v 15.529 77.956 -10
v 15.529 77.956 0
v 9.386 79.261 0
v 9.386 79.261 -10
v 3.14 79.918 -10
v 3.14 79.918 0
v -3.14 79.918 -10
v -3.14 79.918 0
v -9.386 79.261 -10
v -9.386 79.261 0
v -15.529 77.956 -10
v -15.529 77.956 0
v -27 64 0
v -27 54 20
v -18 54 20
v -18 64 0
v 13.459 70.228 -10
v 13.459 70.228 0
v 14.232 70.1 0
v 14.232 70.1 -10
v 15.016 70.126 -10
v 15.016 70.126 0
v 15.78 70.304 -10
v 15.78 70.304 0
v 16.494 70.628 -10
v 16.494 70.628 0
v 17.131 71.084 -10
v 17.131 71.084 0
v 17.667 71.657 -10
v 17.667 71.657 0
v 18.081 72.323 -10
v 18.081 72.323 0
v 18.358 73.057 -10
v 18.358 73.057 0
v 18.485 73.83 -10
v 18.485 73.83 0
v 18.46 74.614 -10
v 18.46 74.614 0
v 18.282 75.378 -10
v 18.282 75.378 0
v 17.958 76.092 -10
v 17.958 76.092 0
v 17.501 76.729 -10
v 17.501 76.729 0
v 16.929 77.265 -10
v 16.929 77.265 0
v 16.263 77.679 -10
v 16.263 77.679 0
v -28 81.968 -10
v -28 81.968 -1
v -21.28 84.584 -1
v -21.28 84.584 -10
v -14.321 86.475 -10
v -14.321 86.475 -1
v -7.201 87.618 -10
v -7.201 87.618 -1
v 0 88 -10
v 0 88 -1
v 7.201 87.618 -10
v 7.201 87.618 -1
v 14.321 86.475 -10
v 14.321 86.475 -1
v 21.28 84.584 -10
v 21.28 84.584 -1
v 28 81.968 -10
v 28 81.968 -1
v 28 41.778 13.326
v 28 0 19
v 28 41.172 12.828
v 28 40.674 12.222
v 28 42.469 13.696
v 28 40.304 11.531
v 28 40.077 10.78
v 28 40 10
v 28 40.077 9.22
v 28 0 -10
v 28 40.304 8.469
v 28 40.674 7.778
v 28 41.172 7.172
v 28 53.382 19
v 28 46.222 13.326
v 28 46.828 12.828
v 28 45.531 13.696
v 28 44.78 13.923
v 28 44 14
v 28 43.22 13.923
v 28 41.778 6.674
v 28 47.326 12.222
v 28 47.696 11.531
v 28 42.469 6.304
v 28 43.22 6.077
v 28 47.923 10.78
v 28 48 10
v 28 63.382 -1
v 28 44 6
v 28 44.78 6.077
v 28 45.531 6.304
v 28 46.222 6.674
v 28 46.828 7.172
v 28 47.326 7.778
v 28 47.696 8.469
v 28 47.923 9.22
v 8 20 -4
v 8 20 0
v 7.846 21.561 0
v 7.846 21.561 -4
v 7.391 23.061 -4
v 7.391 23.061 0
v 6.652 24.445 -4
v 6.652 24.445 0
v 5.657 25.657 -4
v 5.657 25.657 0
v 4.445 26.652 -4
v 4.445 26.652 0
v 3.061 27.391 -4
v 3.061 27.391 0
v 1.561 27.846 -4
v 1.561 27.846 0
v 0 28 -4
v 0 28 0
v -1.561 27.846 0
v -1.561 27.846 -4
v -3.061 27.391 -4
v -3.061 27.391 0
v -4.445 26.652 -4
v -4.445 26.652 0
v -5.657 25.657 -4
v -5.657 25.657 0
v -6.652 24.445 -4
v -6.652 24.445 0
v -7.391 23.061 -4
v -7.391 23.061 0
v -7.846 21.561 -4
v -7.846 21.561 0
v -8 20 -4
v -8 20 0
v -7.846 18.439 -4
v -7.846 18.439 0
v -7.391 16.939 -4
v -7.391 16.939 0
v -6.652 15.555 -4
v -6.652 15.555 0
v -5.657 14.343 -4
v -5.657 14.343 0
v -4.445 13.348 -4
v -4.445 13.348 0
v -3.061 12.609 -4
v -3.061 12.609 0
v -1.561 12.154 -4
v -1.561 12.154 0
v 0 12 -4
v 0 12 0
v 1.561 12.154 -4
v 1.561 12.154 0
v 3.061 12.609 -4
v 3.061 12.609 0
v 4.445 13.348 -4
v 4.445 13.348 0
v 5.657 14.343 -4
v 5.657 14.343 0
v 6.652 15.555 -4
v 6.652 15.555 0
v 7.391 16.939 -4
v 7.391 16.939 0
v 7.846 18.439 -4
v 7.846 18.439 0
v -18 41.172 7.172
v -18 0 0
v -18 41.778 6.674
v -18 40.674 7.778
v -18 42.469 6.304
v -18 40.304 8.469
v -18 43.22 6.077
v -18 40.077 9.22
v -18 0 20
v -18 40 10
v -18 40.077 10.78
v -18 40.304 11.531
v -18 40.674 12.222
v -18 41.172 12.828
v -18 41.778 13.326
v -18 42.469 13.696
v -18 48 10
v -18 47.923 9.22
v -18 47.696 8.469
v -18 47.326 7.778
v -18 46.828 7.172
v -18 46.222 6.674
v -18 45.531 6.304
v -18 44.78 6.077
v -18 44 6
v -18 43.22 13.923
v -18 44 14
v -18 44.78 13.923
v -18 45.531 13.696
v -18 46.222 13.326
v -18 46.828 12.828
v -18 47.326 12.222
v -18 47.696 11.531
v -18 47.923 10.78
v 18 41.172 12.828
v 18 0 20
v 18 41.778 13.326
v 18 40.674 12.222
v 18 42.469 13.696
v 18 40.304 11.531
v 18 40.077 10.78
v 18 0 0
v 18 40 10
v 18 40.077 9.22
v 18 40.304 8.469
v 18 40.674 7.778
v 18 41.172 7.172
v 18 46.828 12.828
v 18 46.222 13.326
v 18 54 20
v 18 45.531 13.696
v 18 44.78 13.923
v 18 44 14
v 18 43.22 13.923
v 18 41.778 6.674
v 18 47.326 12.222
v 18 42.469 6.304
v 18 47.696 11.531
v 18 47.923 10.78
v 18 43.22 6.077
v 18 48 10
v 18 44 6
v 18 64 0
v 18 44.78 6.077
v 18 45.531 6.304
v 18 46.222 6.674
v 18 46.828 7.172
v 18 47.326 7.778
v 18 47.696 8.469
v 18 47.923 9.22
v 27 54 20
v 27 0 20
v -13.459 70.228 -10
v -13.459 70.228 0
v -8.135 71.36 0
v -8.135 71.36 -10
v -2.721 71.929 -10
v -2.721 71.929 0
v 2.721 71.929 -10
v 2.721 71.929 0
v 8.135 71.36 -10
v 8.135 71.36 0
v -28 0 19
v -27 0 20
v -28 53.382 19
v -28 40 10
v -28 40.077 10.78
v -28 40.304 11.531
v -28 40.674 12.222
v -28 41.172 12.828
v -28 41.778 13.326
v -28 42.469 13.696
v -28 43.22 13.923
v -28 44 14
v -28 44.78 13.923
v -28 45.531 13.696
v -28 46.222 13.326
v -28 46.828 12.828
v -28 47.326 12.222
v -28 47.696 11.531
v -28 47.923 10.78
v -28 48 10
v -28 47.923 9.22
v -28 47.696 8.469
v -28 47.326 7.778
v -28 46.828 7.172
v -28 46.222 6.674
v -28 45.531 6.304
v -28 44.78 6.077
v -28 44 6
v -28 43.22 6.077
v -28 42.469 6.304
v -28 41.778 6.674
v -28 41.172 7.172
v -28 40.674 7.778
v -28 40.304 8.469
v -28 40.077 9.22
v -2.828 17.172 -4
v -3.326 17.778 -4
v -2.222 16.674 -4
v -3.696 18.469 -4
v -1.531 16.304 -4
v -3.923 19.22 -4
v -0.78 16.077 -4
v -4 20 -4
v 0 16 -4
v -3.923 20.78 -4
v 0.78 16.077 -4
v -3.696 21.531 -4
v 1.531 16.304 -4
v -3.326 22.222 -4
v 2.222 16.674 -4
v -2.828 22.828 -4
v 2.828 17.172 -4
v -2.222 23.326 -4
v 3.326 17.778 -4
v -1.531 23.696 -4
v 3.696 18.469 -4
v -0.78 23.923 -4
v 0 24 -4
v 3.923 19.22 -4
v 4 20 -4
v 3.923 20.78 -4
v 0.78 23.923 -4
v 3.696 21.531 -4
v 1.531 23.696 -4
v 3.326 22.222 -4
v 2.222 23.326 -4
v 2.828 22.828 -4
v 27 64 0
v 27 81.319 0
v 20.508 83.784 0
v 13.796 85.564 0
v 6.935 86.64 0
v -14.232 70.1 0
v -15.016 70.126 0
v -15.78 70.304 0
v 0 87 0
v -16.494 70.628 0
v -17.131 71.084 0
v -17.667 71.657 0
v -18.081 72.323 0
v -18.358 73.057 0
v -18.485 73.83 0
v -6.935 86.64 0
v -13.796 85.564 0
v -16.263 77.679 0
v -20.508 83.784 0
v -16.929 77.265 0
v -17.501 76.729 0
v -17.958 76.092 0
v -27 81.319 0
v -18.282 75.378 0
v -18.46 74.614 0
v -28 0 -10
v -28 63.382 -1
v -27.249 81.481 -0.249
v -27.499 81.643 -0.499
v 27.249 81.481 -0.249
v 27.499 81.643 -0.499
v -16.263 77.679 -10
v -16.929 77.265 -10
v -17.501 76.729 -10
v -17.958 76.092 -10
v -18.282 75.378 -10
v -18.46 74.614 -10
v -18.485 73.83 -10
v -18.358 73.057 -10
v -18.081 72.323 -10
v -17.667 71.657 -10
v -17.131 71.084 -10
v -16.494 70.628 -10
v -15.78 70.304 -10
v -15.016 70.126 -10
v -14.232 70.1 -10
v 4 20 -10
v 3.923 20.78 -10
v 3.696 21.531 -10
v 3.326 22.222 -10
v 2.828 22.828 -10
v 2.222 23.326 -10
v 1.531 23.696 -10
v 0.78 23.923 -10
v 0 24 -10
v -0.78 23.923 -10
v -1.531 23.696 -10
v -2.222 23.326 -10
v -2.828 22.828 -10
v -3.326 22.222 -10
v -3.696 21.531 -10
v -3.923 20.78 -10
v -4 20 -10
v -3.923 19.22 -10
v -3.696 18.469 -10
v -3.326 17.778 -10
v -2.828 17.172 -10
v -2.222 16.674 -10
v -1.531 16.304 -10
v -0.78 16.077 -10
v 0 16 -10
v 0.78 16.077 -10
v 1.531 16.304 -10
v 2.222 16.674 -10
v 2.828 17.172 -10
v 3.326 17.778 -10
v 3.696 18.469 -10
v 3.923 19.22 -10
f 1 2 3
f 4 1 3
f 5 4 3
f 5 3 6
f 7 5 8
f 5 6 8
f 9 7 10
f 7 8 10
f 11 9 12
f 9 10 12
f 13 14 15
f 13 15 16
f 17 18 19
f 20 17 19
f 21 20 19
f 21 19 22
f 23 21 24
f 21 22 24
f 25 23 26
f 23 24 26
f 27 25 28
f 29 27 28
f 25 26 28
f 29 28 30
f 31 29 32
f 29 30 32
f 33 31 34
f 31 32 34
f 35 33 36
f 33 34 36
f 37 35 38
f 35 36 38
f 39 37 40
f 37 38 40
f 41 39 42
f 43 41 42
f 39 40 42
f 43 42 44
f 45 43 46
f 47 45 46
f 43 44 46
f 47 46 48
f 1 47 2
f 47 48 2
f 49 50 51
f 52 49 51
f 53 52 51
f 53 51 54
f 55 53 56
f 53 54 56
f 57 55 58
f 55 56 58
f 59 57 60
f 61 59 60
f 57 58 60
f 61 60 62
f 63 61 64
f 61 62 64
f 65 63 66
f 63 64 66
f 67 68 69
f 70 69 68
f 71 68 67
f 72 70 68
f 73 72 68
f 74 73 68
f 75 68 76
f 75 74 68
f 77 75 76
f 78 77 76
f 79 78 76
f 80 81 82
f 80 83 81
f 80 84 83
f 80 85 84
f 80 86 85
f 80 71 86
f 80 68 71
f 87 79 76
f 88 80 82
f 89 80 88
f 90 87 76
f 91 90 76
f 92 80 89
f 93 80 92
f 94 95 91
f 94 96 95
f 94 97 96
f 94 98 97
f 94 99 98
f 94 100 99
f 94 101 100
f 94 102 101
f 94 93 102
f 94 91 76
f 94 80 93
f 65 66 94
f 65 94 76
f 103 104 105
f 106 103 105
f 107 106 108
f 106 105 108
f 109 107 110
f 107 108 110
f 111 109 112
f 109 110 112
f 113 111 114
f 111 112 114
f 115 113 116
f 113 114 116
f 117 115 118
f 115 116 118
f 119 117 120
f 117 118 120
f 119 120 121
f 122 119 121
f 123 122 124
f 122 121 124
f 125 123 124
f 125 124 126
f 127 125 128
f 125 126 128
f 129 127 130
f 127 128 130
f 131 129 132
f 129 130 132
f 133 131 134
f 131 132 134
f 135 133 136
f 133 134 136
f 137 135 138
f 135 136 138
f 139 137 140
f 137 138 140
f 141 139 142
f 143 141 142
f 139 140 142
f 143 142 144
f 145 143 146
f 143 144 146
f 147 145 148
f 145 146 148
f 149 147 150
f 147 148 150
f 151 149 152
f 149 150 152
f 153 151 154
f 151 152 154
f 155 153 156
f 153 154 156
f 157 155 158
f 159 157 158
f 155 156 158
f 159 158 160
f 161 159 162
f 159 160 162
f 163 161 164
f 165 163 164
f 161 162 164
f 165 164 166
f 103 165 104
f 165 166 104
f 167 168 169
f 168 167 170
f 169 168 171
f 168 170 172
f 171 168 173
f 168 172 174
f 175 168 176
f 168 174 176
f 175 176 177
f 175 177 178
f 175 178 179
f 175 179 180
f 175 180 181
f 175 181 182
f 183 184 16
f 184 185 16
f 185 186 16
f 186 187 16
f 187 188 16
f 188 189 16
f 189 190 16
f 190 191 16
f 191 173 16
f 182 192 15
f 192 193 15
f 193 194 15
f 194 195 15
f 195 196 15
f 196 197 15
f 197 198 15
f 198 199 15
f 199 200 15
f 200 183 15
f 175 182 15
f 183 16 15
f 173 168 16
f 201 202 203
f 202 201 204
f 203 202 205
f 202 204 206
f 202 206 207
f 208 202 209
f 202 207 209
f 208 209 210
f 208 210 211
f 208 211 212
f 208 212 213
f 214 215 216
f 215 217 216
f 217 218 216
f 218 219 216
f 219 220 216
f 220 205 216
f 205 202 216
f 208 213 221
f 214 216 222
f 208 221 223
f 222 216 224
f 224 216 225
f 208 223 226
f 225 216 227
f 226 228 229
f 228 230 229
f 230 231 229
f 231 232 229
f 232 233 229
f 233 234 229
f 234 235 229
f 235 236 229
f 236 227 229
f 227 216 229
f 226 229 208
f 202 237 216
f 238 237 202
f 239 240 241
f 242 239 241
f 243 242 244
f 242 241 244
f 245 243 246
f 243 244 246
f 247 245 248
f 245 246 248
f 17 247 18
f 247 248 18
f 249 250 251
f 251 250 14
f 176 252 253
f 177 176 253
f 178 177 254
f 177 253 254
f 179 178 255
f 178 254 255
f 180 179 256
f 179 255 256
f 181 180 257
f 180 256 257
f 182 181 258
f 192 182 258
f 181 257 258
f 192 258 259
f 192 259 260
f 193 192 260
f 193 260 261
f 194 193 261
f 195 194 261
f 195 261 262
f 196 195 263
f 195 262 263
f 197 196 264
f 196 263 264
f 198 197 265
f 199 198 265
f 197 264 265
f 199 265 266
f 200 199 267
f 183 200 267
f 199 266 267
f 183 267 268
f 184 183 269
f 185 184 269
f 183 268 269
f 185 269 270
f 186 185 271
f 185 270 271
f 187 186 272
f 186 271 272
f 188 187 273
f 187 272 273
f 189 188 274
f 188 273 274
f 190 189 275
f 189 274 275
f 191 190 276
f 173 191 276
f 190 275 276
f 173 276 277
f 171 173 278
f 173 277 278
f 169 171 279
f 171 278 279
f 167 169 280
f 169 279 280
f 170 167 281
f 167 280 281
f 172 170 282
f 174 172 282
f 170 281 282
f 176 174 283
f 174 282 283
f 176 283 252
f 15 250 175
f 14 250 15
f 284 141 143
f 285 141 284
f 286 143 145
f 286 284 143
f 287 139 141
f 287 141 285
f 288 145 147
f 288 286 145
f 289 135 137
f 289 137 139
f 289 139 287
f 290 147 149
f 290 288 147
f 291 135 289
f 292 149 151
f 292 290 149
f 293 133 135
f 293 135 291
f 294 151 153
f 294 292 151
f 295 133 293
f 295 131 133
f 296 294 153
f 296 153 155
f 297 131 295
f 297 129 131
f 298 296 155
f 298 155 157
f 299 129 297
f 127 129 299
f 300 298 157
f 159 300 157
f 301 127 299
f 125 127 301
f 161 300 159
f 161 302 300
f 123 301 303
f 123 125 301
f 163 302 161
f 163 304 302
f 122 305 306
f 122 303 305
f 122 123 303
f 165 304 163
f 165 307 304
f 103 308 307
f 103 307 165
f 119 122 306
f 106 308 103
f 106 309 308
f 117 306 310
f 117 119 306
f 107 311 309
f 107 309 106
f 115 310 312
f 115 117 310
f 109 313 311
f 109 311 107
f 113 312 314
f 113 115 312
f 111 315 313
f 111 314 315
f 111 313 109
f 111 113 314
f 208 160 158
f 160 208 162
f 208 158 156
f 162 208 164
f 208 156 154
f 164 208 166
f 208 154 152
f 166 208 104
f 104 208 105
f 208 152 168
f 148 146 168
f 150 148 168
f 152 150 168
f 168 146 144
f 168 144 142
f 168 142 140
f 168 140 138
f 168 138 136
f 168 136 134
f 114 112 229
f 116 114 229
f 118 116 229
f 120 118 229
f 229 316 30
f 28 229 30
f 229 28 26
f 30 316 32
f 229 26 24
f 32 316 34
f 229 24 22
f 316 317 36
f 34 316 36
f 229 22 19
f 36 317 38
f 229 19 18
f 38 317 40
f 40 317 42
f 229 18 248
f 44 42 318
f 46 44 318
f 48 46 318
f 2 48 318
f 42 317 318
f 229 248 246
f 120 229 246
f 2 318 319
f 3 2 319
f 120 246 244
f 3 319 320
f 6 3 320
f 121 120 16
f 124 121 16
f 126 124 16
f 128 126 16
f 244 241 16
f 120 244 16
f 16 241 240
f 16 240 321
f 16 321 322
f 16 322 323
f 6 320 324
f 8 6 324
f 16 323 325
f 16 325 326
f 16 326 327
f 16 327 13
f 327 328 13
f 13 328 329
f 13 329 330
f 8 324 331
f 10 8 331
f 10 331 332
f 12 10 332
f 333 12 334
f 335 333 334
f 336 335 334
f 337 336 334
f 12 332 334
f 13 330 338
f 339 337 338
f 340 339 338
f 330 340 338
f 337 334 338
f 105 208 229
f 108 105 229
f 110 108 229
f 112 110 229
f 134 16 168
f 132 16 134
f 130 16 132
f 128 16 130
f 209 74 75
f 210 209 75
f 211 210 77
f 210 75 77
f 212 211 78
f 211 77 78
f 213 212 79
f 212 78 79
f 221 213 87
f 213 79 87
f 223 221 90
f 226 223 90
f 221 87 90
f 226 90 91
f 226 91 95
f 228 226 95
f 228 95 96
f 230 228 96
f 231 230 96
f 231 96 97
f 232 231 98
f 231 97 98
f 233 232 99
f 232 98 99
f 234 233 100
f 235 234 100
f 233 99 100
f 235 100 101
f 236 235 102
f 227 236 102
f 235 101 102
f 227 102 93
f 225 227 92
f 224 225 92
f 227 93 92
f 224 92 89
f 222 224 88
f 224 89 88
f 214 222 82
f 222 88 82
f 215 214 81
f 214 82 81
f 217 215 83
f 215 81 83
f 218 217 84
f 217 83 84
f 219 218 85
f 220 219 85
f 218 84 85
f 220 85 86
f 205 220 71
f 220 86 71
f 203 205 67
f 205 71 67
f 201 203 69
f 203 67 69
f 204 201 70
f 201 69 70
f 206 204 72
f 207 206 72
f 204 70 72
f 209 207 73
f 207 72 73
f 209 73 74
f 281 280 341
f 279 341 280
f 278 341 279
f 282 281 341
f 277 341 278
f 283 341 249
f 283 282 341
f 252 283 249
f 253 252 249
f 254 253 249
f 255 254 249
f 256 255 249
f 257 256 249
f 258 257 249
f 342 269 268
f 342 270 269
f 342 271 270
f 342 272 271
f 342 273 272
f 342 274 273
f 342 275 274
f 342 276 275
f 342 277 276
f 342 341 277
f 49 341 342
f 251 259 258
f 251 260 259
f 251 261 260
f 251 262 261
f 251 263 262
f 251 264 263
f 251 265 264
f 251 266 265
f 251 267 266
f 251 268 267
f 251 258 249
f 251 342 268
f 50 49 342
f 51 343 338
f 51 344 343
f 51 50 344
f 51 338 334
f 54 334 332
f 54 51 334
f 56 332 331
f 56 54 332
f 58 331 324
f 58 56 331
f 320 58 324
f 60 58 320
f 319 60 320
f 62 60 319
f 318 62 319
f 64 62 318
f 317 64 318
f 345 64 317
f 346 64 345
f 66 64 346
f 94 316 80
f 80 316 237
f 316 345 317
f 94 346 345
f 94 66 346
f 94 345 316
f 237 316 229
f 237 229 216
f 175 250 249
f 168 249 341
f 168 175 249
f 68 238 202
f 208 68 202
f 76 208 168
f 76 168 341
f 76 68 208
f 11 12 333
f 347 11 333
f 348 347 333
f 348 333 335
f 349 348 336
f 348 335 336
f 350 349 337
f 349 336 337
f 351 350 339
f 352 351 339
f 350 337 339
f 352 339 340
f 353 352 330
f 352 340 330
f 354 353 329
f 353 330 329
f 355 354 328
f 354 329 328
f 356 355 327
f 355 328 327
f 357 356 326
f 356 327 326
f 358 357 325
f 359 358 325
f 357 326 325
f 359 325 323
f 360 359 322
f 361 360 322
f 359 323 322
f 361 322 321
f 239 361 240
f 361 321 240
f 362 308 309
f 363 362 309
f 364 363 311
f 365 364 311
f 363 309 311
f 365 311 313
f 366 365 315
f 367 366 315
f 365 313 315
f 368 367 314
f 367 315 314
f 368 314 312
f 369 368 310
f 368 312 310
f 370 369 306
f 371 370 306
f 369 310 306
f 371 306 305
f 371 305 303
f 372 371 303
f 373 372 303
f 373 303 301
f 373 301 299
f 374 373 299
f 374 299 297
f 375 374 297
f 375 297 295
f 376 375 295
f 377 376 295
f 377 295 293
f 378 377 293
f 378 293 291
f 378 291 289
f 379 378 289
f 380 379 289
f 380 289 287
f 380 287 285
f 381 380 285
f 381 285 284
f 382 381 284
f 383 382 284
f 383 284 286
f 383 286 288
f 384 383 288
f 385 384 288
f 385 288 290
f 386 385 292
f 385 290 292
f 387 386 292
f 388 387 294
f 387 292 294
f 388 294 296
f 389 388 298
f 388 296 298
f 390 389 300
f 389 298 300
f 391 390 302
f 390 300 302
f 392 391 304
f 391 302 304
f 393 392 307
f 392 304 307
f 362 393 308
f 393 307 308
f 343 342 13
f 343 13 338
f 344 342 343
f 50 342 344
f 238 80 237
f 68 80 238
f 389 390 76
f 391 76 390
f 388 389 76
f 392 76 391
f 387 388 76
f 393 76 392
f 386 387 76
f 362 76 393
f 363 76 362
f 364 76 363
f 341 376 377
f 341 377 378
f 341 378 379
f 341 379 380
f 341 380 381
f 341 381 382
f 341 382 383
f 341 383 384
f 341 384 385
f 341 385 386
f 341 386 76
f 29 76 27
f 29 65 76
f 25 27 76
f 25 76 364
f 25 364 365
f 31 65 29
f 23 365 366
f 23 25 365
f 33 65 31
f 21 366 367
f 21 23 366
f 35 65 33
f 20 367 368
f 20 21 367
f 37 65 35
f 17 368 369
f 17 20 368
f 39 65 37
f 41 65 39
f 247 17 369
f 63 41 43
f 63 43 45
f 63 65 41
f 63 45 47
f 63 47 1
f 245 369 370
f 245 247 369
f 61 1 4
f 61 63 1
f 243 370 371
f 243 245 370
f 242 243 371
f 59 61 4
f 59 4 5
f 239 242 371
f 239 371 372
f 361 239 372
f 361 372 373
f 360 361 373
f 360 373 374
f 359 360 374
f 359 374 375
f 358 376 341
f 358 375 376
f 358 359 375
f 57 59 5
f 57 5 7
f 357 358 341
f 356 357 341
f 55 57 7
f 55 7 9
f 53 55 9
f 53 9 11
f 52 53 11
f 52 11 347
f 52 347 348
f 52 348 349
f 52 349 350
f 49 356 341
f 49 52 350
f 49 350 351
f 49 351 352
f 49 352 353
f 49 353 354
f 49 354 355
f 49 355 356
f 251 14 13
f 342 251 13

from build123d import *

# Parameters (mm, degrees)
BOSS_EXTRUDE2_DEPTH = 10
SKETCH1_4_R         = 8
CUT_EXTRUDE1_DEPTH  = 4
SKETCH1_6_R         = 4
CUT_EXTRUDE2_DEPTH  = 24
SKETCH2_R           = 4
BOSS_EXTRUDE3_DEPTH = 10
BOSS_EXTRUDE4_START = -10
SKETCH3_R           = 4
BOSS_EXTRUDE4_DEPTH = 10
CHAMFER1_SIZE       = 1


with BuildPart() as part:
    # Sketch1 → Boss-Extrude2 (new body)
    with BuildSketch(Plane.XY):
        with BuildLine():
            Line((-28, 81.967733539), (-28, 0))
            Line((-28, 0), (28, 0))
            Line((28, 0), (28, 81.967733539))
            ThreePointArc((28, 81.967733539), (0, 88), (-28, 81.967733539))
        make_face()
        with BuildLine():
            ThreePointArc((-15.529142706, 77.955549577), (0, 80), (15.529142706, 77.955549577))
            ThreePointArc((15.529142706, 77.955549577), (18.357569831, 73.056570092), (13.458590345, 70.228142967))
            ThreePointArc((13.458590345, 70.228142967), (0, 72), (-13.458590345, 70.228142967))
            ThreePointArc((-13.458590345, 70.228142967), (-18.357569831, 73.056570092), (-15.529142706, 77.955549577))
        make_face(mode=Mode.SUBTRACT)
    extrude(amount=-BOSS_EXTRUDE2_DEPTH)

    # Sketch1<4> → Cut-Extrude1 (cut)
    with BuildSketch(Plane.XY):
        with Locations((0, 20)):
            Circle(SKETCH1_4_R)
    extrude(amount=-CUT_EXTRUDE1_DEPTH, mode=Mode.SUBTRACT)

    # Sketch1<6> → Cut-Extrude2 (cut)
    with BuildSketch(Plane.XY):
        with Locations((0, 20)):
            Circle(SKETCH1_6_R)
    extrude(amount=-CUT_EXTRUDE2_DEPTH, mode=Mode.SUBTRACT)

    # Sketch2 → Boss-Extrude3 (add)
    with BuildSketch(Plane.ZY.offset(28)):
        Polygon((0, 64), (0, 0), (20, 0), (20, 54), align=None)
        with Locations((10, 44)):
            Circle(SKETCH2_R, mode=Mode.SUBTRACT)
    extrude(amount=-BOSS_EXTRUDE3_DEPTH)

    # Sketch3 → Boss-Extrude4 (add)
    with BuildSketch(Plane(origin=(28, 0, 0), x_dir=(0, 0, -1), z_dir=(1, 0, 0)).offset(BOSS_EXTRUDE4_START)):
        Polygon((-20, 54), (-20, 0), (0, 0), (0, 64), align=None)
        with Locations((-10, 44)):
            Circle(SKETCH3_R, mode=Mode.SUBTRACT)
    extrude(amount=BOSS_EXTRUDE4_DEPTH)

    # Chamfer1
    chamfer1_edges = [part.edges().sort_by_distance(p)[0] for p in [
        (28, 27, 20),
        (28, 59, 10),
        (28, 72.98386677, 0),
        (0, 88, 0),
        (-28, 72.98386677, 0),
        (-28, 59, 10),
        (-28, 27, 20),
    ]]
    chamfer(chamfer1_edges, length=CHAMFER1_SIZE)


solid = part.part
